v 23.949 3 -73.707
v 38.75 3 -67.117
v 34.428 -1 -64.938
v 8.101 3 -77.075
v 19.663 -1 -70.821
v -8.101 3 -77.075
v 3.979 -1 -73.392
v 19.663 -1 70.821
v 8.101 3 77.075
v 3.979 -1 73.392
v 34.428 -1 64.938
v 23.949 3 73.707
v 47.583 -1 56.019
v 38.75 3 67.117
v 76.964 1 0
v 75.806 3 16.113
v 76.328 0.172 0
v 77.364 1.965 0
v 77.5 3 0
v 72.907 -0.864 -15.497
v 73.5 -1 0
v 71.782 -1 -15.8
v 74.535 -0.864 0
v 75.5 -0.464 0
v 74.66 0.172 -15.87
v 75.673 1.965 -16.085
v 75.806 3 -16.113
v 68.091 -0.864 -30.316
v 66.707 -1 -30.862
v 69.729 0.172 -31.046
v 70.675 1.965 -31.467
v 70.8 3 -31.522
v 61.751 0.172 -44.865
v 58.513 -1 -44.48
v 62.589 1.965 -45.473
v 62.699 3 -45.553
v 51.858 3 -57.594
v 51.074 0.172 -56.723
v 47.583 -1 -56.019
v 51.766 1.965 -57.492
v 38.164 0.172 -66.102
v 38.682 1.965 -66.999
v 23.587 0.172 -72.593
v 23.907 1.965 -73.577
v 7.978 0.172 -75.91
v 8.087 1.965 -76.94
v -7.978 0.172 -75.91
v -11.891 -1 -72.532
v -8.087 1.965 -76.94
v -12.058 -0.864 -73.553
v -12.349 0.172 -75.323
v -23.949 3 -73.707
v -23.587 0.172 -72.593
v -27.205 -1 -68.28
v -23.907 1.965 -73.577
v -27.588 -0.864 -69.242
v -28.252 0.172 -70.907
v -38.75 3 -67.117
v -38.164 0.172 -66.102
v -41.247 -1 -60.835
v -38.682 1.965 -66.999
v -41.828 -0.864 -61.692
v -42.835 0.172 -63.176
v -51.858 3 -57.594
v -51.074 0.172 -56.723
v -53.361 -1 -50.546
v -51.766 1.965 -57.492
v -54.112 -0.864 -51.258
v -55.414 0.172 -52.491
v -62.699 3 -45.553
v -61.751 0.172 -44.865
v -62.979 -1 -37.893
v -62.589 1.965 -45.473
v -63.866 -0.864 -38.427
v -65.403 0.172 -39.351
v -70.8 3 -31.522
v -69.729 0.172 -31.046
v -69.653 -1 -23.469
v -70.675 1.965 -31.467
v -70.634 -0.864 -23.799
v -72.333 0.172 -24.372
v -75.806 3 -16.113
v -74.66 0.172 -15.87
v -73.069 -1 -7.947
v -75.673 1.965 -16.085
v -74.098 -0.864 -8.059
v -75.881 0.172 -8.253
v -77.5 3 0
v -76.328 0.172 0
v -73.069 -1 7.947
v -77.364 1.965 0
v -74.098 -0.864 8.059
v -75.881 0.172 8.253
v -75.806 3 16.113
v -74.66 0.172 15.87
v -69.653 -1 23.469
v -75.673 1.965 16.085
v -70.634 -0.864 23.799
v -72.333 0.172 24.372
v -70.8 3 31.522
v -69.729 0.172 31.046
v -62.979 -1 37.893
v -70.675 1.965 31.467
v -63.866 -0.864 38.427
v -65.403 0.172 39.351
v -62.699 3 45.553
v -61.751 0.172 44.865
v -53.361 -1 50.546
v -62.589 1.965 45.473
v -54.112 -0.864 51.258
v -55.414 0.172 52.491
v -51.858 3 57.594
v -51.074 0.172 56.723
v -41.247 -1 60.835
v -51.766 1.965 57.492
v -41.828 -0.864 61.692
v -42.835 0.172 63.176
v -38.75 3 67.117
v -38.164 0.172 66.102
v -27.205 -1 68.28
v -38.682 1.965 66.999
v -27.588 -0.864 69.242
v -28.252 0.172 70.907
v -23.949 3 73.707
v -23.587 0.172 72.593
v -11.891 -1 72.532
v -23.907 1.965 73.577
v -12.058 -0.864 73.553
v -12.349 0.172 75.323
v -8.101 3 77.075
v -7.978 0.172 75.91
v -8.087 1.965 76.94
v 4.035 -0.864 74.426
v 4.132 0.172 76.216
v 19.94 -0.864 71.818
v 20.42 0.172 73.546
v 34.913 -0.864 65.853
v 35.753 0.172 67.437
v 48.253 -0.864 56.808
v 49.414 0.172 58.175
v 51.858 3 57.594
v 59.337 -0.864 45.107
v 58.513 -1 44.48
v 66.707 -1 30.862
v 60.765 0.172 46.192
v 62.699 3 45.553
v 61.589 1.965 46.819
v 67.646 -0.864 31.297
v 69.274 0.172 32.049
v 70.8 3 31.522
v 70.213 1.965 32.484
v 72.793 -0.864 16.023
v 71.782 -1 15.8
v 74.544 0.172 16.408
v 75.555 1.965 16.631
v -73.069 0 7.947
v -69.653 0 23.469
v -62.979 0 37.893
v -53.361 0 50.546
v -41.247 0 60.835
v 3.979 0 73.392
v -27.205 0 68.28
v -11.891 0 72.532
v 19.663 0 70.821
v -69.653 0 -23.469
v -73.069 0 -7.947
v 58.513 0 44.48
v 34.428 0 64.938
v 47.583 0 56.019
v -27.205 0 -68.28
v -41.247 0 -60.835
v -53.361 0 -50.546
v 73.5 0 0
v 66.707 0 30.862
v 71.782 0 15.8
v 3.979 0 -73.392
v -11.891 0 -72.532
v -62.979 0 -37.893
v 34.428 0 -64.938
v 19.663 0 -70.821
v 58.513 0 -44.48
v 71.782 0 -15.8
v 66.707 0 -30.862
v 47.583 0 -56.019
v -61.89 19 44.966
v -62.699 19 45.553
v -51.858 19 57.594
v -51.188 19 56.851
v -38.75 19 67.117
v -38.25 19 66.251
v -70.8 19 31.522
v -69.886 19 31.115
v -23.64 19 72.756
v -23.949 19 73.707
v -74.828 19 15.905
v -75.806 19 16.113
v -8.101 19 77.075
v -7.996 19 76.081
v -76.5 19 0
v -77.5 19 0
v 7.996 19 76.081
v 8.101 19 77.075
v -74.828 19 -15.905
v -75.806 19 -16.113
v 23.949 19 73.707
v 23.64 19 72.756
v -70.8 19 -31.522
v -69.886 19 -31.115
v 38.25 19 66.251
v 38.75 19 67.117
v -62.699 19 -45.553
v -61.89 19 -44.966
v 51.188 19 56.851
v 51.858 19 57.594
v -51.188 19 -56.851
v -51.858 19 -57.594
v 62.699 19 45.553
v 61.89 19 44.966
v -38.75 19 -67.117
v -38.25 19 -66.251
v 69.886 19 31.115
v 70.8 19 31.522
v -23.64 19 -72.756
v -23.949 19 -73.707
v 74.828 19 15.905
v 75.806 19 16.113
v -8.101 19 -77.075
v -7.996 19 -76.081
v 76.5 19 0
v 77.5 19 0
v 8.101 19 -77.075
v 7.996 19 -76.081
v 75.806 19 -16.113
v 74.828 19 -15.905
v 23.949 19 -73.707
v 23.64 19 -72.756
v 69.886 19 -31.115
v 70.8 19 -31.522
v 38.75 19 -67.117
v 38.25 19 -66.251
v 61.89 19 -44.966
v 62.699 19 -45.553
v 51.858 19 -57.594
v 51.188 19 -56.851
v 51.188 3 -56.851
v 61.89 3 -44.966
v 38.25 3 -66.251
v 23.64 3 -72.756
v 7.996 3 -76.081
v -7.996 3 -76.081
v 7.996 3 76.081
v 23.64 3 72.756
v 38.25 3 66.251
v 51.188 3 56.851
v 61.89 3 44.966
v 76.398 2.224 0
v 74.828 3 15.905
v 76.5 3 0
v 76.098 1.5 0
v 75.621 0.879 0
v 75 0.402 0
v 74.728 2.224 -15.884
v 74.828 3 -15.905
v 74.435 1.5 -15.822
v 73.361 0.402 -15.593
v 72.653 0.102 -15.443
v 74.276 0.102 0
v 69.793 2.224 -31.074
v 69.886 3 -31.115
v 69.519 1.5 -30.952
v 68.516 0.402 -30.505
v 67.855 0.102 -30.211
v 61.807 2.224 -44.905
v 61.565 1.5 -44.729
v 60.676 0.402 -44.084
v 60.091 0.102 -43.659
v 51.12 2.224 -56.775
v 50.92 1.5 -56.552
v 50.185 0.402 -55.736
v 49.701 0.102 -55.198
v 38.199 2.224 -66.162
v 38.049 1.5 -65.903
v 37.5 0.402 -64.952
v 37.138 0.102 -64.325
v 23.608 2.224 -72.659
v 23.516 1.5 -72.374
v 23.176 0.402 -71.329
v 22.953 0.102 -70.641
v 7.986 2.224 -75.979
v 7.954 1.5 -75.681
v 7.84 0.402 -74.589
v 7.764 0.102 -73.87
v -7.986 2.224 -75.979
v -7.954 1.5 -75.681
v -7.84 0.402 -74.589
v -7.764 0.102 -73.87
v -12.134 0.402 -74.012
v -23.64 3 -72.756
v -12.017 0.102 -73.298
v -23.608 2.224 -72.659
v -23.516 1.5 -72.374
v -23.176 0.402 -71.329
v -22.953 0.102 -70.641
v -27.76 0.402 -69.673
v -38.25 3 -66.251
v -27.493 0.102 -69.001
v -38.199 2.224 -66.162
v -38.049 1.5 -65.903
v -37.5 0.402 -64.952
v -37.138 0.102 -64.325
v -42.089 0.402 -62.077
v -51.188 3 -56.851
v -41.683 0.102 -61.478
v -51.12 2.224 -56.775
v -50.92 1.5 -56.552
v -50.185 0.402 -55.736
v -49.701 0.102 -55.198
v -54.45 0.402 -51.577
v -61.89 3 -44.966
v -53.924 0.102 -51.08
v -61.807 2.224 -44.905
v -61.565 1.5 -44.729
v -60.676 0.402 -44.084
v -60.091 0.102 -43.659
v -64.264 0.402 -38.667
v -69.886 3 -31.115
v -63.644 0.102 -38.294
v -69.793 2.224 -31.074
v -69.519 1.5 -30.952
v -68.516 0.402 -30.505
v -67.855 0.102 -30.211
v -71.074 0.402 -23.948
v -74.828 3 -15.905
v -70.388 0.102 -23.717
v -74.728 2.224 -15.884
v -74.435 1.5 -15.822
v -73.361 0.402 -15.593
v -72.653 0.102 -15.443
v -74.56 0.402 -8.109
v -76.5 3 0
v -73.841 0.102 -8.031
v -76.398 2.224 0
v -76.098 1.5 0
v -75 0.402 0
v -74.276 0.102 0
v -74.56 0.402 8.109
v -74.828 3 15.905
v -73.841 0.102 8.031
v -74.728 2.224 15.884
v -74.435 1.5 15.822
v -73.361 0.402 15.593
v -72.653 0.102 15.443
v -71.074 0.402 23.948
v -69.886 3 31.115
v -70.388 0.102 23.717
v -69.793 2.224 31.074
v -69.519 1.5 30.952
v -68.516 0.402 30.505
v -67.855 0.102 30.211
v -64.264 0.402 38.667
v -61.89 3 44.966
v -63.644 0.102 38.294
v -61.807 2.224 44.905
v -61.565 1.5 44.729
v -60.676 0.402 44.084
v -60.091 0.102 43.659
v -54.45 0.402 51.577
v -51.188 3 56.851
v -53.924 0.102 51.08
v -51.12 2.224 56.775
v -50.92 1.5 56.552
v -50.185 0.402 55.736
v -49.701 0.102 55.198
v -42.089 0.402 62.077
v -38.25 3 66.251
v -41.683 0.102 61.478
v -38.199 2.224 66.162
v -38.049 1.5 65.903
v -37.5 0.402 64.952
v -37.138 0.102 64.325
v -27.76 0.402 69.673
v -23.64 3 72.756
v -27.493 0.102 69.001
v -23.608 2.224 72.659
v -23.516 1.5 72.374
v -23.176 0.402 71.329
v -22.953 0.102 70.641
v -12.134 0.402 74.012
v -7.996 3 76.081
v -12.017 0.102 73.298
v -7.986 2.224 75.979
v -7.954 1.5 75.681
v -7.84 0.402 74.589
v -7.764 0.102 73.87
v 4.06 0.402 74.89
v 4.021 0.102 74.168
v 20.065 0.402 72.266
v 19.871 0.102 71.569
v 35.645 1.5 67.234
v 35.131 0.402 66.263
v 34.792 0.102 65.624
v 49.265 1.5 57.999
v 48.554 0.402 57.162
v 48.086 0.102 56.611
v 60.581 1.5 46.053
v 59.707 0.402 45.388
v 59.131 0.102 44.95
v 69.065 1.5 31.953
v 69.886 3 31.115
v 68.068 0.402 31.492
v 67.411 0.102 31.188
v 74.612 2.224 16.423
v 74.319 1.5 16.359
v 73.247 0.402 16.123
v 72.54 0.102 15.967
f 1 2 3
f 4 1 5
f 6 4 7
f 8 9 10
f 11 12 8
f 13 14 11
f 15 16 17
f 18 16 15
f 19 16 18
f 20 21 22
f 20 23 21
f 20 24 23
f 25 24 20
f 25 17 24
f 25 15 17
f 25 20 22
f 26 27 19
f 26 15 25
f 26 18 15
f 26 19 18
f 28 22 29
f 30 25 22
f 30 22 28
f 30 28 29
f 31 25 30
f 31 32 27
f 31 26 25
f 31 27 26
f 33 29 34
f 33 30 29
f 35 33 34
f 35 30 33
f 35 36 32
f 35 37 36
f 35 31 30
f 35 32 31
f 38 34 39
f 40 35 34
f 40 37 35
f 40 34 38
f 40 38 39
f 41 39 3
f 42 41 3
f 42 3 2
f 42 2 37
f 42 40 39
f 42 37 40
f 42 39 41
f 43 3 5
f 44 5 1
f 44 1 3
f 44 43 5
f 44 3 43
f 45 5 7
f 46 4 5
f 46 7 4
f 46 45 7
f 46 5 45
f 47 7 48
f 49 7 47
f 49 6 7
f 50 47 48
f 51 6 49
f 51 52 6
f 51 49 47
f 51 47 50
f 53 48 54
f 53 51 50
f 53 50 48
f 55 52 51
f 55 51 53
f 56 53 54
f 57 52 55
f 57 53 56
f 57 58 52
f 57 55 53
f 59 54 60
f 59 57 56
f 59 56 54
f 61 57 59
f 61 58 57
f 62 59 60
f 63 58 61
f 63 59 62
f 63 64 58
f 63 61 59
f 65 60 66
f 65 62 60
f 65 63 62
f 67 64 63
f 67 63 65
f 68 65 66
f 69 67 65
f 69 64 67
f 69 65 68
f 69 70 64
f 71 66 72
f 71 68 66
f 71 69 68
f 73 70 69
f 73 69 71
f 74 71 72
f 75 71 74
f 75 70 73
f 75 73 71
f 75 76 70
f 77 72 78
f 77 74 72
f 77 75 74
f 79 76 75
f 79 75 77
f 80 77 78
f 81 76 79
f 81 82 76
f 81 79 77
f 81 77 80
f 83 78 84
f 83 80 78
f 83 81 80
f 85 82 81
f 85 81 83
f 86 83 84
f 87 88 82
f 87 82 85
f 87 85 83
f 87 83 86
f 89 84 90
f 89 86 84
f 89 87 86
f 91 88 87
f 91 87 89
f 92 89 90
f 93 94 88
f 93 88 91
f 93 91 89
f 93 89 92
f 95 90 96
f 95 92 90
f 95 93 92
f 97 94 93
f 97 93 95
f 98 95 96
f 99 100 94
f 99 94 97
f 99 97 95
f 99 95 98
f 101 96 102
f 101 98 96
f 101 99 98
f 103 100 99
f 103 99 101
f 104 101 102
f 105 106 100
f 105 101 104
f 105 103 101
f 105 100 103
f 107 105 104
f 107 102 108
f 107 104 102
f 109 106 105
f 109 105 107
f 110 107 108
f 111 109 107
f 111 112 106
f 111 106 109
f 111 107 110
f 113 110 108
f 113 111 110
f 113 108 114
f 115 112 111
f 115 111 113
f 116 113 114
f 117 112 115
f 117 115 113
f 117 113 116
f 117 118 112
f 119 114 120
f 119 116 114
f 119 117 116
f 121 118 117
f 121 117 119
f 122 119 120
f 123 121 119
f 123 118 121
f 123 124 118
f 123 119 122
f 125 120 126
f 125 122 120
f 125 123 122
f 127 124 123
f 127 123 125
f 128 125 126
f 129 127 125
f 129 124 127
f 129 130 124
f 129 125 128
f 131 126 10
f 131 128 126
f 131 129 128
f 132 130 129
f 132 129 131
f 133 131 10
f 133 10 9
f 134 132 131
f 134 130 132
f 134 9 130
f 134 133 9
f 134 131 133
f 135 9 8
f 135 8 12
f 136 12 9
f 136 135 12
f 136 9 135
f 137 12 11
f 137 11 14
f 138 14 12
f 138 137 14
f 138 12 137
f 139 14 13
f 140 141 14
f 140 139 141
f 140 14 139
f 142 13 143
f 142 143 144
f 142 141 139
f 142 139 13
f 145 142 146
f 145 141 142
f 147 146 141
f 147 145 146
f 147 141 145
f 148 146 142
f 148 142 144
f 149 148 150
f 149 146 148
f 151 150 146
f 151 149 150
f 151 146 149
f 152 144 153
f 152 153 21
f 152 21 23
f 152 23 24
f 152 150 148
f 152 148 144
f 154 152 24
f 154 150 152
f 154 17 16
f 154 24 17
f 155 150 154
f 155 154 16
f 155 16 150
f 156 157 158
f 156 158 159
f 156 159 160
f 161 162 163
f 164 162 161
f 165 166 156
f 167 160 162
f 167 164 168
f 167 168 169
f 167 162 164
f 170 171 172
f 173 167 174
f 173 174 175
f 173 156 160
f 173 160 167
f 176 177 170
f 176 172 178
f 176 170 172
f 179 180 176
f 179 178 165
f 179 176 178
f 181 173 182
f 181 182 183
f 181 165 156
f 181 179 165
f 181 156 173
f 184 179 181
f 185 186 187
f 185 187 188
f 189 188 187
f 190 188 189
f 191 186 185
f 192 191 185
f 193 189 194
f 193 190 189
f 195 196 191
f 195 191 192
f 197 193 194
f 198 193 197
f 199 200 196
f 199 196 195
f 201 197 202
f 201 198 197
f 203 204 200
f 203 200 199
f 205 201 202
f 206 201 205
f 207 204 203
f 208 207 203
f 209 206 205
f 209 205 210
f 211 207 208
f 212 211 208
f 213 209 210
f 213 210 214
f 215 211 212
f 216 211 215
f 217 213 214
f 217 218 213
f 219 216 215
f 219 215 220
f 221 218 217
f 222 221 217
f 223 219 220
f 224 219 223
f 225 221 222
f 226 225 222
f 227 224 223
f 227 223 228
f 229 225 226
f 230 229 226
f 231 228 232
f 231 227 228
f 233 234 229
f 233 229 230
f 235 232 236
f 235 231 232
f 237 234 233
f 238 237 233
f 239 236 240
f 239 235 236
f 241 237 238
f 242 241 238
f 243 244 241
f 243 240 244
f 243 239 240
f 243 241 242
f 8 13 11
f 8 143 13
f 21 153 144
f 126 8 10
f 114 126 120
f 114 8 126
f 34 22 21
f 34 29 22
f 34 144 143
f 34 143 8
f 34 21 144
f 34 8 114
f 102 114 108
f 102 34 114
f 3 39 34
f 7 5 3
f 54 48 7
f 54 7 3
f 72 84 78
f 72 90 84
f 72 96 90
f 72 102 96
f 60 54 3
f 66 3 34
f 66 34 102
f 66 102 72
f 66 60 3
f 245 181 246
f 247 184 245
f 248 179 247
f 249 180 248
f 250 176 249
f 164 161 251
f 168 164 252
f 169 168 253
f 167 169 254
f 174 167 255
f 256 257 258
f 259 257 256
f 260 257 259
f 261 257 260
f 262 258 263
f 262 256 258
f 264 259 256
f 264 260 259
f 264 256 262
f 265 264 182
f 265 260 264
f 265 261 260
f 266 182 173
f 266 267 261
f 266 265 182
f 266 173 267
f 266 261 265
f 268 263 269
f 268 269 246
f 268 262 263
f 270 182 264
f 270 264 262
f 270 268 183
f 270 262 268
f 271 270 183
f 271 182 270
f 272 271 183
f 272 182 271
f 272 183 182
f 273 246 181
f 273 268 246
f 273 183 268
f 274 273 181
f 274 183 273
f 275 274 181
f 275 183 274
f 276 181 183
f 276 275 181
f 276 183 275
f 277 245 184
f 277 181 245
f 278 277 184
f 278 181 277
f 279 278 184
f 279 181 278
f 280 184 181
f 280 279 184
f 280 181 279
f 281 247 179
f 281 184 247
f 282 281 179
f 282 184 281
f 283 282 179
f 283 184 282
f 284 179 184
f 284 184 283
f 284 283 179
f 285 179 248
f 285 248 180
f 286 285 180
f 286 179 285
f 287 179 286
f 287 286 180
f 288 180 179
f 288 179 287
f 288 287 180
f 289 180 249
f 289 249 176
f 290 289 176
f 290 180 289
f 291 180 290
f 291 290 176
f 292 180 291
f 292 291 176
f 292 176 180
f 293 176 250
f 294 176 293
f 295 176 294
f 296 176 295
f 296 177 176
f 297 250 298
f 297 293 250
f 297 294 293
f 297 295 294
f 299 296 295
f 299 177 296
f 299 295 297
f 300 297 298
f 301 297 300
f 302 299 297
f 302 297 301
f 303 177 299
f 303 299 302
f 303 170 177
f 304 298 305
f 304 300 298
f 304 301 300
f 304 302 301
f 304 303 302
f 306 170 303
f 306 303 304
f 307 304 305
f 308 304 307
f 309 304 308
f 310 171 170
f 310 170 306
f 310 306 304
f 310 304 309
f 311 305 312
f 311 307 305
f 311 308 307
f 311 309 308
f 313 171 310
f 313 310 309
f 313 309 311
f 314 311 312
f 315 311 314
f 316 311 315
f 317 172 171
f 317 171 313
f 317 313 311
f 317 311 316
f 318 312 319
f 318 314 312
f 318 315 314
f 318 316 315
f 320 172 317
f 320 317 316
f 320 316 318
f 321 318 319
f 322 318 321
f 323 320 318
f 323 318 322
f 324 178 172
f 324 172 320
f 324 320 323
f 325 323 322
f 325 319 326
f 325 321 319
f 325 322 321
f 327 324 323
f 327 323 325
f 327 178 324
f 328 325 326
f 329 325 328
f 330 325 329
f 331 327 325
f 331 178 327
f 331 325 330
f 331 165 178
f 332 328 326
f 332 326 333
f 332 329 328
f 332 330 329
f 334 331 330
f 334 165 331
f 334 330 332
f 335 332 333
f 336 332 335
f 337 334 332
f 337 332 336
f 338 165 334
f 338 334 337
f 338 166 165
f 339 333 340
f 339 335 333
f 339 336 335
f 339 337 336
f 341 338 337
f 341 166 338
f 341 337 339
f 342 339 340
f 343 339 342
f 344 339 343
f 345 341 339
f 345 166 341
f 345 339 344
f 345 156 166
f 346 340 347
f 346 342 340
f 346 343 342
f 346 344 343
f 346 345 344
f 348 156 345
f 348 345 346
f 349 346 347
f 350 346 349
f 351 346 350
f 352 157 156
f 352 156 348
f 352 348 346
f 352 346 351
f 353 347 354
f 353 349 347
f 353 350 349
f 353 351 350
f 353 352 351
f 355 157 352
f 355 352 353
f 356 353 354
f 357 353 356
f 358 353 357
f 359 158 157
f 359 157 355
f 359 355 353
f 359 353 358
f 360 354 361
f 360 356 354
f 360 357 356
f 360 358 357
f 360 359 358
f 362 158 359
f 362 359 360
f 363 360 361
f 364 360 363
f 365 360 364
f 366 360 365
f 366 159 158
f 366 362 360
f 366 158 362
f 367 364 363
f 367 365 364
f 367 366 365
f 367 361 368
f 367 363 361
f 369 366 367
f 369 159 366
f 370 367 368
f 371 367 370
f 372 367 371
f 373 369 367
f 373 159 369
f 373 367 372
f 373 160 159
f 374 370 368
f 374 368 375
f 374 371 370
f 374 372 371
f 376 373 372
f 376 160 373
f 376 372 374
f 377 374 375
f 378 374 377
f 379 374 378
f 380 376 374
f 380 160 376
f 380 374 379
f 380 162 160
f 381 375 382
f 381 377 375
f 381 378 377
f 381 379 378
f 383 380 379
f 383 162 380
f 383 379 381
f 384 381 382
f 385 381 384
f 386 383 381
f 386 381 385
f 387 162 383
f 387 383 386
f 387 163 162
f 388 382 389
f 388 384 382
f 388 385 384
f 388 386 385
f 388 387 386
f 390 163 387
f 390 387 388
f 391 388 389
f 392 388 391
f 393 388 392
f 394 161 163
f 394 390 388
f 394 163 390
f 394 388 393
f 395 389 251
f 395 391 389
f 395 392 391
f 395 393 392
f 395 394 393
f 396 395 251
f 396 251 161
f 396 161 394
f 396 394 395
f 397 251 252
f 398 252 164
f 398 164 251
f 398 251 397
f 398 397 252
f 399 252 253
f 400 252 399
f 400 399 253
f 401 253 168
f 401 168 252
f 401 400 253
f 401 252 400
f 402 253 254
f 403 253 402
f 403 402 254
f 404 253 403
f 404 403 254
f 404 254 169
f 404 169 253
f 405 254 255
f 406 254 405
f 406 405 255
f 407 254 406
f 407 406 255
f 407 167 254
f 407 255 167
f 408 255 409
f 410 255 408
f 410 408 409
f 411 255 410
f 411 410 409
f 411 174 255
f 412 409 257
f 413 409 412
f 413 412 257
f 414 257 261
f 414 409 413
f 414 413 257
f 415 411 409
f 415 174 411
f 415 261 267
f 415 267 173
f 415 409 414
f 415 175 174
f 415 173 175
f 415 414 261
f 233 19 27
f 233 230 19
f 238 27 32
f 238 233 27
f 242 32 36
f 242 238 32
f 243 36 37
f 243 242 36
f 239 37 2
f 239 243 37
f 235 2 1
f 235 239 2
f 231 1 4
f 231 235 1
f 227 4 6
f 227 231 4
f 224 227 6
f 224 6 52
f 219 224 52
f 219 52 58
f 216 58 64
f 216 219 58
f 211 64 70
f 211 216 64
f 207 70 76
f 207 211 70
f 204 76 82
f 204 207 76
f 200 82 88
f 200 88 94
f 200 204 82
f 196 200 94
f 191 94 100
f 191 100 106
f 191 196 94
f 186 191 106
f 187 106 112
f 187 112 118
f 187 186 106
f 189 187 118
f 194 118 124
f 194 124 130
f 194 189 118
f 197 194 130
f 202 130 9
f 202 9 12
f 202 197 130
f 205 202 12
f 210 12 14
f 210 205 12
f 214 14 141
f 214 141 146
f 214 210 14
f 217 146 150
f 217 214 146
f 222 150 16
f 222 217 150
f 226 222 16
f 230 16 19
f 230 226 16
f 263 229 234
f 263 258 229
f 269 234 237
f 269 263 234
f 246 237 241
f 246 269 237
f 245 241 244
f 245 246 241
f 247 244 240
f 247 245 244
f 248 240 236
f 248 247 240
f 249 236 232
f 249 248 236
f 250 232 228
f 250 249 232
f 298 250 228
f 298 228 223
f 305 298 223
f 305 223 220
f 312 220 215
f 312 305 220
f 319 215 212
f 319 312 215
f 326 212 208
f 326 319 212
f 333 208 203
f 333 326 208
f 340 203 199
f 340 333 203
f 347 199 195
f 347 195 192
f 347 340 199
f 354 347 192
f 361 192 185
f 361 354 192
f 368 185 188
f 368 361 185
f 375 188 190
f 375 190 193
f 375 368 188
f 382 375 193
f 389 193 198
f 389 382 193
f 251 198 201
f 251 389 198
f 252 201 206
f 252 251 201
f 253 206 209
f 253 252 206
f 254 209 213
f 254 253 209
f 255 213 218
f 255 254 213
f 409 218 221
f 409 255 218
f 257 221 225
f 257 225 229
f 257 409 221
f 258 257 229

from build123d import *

# Parameters (mm, degrees)
SKETCH1_R          = 72.5
BASE_FLANGE1_DEPTH = 1


# Read off the part's stored shape, not the designer's step: Edge-Flange1
# Sheet-metal steps are written as plain solids
with BuildPart() as part:
    # Sketch1 → Base-Flange1 (new body)
    with BuildSketch(Plane(origin=(0, 0, 0), x_dir=(1, 0, 0), z_dir=(0, 1, 0))):
        with Locations(Location((0, 0, 0), (0, 0, 270))):
            Circle(SKETCH1_R)
    extrude(amount=-BASE_FLANGE1_DEPTH)

    # Edge-Flange1 outline → Edge-Flange1 (revolve)
    with BuildSketch(Plane.XY):
        with BuildLine():
            Line((77.5, 19), (76.5, 19))
            Line((76.5, 19), (76.5, 3))
            ThreePointArc((76.5, 3), (75.621320344, 0.878679656), (73.5, 0))
            Line((73.5, 0), (72.5, 0))
            Line((72.5, 0), (72.5, -1))
            Line((72.5, -1), (73.5, -1))
            ThreePointArc((73.5, -1), (76.328427125, 0.171572875), (77.5, 3))
            Line((77.5, 3), (77.5, 19))
        make_face()
    revolve(axis=Axis((0, 0, 0), (0, 1, 0)))


solid = part.part
